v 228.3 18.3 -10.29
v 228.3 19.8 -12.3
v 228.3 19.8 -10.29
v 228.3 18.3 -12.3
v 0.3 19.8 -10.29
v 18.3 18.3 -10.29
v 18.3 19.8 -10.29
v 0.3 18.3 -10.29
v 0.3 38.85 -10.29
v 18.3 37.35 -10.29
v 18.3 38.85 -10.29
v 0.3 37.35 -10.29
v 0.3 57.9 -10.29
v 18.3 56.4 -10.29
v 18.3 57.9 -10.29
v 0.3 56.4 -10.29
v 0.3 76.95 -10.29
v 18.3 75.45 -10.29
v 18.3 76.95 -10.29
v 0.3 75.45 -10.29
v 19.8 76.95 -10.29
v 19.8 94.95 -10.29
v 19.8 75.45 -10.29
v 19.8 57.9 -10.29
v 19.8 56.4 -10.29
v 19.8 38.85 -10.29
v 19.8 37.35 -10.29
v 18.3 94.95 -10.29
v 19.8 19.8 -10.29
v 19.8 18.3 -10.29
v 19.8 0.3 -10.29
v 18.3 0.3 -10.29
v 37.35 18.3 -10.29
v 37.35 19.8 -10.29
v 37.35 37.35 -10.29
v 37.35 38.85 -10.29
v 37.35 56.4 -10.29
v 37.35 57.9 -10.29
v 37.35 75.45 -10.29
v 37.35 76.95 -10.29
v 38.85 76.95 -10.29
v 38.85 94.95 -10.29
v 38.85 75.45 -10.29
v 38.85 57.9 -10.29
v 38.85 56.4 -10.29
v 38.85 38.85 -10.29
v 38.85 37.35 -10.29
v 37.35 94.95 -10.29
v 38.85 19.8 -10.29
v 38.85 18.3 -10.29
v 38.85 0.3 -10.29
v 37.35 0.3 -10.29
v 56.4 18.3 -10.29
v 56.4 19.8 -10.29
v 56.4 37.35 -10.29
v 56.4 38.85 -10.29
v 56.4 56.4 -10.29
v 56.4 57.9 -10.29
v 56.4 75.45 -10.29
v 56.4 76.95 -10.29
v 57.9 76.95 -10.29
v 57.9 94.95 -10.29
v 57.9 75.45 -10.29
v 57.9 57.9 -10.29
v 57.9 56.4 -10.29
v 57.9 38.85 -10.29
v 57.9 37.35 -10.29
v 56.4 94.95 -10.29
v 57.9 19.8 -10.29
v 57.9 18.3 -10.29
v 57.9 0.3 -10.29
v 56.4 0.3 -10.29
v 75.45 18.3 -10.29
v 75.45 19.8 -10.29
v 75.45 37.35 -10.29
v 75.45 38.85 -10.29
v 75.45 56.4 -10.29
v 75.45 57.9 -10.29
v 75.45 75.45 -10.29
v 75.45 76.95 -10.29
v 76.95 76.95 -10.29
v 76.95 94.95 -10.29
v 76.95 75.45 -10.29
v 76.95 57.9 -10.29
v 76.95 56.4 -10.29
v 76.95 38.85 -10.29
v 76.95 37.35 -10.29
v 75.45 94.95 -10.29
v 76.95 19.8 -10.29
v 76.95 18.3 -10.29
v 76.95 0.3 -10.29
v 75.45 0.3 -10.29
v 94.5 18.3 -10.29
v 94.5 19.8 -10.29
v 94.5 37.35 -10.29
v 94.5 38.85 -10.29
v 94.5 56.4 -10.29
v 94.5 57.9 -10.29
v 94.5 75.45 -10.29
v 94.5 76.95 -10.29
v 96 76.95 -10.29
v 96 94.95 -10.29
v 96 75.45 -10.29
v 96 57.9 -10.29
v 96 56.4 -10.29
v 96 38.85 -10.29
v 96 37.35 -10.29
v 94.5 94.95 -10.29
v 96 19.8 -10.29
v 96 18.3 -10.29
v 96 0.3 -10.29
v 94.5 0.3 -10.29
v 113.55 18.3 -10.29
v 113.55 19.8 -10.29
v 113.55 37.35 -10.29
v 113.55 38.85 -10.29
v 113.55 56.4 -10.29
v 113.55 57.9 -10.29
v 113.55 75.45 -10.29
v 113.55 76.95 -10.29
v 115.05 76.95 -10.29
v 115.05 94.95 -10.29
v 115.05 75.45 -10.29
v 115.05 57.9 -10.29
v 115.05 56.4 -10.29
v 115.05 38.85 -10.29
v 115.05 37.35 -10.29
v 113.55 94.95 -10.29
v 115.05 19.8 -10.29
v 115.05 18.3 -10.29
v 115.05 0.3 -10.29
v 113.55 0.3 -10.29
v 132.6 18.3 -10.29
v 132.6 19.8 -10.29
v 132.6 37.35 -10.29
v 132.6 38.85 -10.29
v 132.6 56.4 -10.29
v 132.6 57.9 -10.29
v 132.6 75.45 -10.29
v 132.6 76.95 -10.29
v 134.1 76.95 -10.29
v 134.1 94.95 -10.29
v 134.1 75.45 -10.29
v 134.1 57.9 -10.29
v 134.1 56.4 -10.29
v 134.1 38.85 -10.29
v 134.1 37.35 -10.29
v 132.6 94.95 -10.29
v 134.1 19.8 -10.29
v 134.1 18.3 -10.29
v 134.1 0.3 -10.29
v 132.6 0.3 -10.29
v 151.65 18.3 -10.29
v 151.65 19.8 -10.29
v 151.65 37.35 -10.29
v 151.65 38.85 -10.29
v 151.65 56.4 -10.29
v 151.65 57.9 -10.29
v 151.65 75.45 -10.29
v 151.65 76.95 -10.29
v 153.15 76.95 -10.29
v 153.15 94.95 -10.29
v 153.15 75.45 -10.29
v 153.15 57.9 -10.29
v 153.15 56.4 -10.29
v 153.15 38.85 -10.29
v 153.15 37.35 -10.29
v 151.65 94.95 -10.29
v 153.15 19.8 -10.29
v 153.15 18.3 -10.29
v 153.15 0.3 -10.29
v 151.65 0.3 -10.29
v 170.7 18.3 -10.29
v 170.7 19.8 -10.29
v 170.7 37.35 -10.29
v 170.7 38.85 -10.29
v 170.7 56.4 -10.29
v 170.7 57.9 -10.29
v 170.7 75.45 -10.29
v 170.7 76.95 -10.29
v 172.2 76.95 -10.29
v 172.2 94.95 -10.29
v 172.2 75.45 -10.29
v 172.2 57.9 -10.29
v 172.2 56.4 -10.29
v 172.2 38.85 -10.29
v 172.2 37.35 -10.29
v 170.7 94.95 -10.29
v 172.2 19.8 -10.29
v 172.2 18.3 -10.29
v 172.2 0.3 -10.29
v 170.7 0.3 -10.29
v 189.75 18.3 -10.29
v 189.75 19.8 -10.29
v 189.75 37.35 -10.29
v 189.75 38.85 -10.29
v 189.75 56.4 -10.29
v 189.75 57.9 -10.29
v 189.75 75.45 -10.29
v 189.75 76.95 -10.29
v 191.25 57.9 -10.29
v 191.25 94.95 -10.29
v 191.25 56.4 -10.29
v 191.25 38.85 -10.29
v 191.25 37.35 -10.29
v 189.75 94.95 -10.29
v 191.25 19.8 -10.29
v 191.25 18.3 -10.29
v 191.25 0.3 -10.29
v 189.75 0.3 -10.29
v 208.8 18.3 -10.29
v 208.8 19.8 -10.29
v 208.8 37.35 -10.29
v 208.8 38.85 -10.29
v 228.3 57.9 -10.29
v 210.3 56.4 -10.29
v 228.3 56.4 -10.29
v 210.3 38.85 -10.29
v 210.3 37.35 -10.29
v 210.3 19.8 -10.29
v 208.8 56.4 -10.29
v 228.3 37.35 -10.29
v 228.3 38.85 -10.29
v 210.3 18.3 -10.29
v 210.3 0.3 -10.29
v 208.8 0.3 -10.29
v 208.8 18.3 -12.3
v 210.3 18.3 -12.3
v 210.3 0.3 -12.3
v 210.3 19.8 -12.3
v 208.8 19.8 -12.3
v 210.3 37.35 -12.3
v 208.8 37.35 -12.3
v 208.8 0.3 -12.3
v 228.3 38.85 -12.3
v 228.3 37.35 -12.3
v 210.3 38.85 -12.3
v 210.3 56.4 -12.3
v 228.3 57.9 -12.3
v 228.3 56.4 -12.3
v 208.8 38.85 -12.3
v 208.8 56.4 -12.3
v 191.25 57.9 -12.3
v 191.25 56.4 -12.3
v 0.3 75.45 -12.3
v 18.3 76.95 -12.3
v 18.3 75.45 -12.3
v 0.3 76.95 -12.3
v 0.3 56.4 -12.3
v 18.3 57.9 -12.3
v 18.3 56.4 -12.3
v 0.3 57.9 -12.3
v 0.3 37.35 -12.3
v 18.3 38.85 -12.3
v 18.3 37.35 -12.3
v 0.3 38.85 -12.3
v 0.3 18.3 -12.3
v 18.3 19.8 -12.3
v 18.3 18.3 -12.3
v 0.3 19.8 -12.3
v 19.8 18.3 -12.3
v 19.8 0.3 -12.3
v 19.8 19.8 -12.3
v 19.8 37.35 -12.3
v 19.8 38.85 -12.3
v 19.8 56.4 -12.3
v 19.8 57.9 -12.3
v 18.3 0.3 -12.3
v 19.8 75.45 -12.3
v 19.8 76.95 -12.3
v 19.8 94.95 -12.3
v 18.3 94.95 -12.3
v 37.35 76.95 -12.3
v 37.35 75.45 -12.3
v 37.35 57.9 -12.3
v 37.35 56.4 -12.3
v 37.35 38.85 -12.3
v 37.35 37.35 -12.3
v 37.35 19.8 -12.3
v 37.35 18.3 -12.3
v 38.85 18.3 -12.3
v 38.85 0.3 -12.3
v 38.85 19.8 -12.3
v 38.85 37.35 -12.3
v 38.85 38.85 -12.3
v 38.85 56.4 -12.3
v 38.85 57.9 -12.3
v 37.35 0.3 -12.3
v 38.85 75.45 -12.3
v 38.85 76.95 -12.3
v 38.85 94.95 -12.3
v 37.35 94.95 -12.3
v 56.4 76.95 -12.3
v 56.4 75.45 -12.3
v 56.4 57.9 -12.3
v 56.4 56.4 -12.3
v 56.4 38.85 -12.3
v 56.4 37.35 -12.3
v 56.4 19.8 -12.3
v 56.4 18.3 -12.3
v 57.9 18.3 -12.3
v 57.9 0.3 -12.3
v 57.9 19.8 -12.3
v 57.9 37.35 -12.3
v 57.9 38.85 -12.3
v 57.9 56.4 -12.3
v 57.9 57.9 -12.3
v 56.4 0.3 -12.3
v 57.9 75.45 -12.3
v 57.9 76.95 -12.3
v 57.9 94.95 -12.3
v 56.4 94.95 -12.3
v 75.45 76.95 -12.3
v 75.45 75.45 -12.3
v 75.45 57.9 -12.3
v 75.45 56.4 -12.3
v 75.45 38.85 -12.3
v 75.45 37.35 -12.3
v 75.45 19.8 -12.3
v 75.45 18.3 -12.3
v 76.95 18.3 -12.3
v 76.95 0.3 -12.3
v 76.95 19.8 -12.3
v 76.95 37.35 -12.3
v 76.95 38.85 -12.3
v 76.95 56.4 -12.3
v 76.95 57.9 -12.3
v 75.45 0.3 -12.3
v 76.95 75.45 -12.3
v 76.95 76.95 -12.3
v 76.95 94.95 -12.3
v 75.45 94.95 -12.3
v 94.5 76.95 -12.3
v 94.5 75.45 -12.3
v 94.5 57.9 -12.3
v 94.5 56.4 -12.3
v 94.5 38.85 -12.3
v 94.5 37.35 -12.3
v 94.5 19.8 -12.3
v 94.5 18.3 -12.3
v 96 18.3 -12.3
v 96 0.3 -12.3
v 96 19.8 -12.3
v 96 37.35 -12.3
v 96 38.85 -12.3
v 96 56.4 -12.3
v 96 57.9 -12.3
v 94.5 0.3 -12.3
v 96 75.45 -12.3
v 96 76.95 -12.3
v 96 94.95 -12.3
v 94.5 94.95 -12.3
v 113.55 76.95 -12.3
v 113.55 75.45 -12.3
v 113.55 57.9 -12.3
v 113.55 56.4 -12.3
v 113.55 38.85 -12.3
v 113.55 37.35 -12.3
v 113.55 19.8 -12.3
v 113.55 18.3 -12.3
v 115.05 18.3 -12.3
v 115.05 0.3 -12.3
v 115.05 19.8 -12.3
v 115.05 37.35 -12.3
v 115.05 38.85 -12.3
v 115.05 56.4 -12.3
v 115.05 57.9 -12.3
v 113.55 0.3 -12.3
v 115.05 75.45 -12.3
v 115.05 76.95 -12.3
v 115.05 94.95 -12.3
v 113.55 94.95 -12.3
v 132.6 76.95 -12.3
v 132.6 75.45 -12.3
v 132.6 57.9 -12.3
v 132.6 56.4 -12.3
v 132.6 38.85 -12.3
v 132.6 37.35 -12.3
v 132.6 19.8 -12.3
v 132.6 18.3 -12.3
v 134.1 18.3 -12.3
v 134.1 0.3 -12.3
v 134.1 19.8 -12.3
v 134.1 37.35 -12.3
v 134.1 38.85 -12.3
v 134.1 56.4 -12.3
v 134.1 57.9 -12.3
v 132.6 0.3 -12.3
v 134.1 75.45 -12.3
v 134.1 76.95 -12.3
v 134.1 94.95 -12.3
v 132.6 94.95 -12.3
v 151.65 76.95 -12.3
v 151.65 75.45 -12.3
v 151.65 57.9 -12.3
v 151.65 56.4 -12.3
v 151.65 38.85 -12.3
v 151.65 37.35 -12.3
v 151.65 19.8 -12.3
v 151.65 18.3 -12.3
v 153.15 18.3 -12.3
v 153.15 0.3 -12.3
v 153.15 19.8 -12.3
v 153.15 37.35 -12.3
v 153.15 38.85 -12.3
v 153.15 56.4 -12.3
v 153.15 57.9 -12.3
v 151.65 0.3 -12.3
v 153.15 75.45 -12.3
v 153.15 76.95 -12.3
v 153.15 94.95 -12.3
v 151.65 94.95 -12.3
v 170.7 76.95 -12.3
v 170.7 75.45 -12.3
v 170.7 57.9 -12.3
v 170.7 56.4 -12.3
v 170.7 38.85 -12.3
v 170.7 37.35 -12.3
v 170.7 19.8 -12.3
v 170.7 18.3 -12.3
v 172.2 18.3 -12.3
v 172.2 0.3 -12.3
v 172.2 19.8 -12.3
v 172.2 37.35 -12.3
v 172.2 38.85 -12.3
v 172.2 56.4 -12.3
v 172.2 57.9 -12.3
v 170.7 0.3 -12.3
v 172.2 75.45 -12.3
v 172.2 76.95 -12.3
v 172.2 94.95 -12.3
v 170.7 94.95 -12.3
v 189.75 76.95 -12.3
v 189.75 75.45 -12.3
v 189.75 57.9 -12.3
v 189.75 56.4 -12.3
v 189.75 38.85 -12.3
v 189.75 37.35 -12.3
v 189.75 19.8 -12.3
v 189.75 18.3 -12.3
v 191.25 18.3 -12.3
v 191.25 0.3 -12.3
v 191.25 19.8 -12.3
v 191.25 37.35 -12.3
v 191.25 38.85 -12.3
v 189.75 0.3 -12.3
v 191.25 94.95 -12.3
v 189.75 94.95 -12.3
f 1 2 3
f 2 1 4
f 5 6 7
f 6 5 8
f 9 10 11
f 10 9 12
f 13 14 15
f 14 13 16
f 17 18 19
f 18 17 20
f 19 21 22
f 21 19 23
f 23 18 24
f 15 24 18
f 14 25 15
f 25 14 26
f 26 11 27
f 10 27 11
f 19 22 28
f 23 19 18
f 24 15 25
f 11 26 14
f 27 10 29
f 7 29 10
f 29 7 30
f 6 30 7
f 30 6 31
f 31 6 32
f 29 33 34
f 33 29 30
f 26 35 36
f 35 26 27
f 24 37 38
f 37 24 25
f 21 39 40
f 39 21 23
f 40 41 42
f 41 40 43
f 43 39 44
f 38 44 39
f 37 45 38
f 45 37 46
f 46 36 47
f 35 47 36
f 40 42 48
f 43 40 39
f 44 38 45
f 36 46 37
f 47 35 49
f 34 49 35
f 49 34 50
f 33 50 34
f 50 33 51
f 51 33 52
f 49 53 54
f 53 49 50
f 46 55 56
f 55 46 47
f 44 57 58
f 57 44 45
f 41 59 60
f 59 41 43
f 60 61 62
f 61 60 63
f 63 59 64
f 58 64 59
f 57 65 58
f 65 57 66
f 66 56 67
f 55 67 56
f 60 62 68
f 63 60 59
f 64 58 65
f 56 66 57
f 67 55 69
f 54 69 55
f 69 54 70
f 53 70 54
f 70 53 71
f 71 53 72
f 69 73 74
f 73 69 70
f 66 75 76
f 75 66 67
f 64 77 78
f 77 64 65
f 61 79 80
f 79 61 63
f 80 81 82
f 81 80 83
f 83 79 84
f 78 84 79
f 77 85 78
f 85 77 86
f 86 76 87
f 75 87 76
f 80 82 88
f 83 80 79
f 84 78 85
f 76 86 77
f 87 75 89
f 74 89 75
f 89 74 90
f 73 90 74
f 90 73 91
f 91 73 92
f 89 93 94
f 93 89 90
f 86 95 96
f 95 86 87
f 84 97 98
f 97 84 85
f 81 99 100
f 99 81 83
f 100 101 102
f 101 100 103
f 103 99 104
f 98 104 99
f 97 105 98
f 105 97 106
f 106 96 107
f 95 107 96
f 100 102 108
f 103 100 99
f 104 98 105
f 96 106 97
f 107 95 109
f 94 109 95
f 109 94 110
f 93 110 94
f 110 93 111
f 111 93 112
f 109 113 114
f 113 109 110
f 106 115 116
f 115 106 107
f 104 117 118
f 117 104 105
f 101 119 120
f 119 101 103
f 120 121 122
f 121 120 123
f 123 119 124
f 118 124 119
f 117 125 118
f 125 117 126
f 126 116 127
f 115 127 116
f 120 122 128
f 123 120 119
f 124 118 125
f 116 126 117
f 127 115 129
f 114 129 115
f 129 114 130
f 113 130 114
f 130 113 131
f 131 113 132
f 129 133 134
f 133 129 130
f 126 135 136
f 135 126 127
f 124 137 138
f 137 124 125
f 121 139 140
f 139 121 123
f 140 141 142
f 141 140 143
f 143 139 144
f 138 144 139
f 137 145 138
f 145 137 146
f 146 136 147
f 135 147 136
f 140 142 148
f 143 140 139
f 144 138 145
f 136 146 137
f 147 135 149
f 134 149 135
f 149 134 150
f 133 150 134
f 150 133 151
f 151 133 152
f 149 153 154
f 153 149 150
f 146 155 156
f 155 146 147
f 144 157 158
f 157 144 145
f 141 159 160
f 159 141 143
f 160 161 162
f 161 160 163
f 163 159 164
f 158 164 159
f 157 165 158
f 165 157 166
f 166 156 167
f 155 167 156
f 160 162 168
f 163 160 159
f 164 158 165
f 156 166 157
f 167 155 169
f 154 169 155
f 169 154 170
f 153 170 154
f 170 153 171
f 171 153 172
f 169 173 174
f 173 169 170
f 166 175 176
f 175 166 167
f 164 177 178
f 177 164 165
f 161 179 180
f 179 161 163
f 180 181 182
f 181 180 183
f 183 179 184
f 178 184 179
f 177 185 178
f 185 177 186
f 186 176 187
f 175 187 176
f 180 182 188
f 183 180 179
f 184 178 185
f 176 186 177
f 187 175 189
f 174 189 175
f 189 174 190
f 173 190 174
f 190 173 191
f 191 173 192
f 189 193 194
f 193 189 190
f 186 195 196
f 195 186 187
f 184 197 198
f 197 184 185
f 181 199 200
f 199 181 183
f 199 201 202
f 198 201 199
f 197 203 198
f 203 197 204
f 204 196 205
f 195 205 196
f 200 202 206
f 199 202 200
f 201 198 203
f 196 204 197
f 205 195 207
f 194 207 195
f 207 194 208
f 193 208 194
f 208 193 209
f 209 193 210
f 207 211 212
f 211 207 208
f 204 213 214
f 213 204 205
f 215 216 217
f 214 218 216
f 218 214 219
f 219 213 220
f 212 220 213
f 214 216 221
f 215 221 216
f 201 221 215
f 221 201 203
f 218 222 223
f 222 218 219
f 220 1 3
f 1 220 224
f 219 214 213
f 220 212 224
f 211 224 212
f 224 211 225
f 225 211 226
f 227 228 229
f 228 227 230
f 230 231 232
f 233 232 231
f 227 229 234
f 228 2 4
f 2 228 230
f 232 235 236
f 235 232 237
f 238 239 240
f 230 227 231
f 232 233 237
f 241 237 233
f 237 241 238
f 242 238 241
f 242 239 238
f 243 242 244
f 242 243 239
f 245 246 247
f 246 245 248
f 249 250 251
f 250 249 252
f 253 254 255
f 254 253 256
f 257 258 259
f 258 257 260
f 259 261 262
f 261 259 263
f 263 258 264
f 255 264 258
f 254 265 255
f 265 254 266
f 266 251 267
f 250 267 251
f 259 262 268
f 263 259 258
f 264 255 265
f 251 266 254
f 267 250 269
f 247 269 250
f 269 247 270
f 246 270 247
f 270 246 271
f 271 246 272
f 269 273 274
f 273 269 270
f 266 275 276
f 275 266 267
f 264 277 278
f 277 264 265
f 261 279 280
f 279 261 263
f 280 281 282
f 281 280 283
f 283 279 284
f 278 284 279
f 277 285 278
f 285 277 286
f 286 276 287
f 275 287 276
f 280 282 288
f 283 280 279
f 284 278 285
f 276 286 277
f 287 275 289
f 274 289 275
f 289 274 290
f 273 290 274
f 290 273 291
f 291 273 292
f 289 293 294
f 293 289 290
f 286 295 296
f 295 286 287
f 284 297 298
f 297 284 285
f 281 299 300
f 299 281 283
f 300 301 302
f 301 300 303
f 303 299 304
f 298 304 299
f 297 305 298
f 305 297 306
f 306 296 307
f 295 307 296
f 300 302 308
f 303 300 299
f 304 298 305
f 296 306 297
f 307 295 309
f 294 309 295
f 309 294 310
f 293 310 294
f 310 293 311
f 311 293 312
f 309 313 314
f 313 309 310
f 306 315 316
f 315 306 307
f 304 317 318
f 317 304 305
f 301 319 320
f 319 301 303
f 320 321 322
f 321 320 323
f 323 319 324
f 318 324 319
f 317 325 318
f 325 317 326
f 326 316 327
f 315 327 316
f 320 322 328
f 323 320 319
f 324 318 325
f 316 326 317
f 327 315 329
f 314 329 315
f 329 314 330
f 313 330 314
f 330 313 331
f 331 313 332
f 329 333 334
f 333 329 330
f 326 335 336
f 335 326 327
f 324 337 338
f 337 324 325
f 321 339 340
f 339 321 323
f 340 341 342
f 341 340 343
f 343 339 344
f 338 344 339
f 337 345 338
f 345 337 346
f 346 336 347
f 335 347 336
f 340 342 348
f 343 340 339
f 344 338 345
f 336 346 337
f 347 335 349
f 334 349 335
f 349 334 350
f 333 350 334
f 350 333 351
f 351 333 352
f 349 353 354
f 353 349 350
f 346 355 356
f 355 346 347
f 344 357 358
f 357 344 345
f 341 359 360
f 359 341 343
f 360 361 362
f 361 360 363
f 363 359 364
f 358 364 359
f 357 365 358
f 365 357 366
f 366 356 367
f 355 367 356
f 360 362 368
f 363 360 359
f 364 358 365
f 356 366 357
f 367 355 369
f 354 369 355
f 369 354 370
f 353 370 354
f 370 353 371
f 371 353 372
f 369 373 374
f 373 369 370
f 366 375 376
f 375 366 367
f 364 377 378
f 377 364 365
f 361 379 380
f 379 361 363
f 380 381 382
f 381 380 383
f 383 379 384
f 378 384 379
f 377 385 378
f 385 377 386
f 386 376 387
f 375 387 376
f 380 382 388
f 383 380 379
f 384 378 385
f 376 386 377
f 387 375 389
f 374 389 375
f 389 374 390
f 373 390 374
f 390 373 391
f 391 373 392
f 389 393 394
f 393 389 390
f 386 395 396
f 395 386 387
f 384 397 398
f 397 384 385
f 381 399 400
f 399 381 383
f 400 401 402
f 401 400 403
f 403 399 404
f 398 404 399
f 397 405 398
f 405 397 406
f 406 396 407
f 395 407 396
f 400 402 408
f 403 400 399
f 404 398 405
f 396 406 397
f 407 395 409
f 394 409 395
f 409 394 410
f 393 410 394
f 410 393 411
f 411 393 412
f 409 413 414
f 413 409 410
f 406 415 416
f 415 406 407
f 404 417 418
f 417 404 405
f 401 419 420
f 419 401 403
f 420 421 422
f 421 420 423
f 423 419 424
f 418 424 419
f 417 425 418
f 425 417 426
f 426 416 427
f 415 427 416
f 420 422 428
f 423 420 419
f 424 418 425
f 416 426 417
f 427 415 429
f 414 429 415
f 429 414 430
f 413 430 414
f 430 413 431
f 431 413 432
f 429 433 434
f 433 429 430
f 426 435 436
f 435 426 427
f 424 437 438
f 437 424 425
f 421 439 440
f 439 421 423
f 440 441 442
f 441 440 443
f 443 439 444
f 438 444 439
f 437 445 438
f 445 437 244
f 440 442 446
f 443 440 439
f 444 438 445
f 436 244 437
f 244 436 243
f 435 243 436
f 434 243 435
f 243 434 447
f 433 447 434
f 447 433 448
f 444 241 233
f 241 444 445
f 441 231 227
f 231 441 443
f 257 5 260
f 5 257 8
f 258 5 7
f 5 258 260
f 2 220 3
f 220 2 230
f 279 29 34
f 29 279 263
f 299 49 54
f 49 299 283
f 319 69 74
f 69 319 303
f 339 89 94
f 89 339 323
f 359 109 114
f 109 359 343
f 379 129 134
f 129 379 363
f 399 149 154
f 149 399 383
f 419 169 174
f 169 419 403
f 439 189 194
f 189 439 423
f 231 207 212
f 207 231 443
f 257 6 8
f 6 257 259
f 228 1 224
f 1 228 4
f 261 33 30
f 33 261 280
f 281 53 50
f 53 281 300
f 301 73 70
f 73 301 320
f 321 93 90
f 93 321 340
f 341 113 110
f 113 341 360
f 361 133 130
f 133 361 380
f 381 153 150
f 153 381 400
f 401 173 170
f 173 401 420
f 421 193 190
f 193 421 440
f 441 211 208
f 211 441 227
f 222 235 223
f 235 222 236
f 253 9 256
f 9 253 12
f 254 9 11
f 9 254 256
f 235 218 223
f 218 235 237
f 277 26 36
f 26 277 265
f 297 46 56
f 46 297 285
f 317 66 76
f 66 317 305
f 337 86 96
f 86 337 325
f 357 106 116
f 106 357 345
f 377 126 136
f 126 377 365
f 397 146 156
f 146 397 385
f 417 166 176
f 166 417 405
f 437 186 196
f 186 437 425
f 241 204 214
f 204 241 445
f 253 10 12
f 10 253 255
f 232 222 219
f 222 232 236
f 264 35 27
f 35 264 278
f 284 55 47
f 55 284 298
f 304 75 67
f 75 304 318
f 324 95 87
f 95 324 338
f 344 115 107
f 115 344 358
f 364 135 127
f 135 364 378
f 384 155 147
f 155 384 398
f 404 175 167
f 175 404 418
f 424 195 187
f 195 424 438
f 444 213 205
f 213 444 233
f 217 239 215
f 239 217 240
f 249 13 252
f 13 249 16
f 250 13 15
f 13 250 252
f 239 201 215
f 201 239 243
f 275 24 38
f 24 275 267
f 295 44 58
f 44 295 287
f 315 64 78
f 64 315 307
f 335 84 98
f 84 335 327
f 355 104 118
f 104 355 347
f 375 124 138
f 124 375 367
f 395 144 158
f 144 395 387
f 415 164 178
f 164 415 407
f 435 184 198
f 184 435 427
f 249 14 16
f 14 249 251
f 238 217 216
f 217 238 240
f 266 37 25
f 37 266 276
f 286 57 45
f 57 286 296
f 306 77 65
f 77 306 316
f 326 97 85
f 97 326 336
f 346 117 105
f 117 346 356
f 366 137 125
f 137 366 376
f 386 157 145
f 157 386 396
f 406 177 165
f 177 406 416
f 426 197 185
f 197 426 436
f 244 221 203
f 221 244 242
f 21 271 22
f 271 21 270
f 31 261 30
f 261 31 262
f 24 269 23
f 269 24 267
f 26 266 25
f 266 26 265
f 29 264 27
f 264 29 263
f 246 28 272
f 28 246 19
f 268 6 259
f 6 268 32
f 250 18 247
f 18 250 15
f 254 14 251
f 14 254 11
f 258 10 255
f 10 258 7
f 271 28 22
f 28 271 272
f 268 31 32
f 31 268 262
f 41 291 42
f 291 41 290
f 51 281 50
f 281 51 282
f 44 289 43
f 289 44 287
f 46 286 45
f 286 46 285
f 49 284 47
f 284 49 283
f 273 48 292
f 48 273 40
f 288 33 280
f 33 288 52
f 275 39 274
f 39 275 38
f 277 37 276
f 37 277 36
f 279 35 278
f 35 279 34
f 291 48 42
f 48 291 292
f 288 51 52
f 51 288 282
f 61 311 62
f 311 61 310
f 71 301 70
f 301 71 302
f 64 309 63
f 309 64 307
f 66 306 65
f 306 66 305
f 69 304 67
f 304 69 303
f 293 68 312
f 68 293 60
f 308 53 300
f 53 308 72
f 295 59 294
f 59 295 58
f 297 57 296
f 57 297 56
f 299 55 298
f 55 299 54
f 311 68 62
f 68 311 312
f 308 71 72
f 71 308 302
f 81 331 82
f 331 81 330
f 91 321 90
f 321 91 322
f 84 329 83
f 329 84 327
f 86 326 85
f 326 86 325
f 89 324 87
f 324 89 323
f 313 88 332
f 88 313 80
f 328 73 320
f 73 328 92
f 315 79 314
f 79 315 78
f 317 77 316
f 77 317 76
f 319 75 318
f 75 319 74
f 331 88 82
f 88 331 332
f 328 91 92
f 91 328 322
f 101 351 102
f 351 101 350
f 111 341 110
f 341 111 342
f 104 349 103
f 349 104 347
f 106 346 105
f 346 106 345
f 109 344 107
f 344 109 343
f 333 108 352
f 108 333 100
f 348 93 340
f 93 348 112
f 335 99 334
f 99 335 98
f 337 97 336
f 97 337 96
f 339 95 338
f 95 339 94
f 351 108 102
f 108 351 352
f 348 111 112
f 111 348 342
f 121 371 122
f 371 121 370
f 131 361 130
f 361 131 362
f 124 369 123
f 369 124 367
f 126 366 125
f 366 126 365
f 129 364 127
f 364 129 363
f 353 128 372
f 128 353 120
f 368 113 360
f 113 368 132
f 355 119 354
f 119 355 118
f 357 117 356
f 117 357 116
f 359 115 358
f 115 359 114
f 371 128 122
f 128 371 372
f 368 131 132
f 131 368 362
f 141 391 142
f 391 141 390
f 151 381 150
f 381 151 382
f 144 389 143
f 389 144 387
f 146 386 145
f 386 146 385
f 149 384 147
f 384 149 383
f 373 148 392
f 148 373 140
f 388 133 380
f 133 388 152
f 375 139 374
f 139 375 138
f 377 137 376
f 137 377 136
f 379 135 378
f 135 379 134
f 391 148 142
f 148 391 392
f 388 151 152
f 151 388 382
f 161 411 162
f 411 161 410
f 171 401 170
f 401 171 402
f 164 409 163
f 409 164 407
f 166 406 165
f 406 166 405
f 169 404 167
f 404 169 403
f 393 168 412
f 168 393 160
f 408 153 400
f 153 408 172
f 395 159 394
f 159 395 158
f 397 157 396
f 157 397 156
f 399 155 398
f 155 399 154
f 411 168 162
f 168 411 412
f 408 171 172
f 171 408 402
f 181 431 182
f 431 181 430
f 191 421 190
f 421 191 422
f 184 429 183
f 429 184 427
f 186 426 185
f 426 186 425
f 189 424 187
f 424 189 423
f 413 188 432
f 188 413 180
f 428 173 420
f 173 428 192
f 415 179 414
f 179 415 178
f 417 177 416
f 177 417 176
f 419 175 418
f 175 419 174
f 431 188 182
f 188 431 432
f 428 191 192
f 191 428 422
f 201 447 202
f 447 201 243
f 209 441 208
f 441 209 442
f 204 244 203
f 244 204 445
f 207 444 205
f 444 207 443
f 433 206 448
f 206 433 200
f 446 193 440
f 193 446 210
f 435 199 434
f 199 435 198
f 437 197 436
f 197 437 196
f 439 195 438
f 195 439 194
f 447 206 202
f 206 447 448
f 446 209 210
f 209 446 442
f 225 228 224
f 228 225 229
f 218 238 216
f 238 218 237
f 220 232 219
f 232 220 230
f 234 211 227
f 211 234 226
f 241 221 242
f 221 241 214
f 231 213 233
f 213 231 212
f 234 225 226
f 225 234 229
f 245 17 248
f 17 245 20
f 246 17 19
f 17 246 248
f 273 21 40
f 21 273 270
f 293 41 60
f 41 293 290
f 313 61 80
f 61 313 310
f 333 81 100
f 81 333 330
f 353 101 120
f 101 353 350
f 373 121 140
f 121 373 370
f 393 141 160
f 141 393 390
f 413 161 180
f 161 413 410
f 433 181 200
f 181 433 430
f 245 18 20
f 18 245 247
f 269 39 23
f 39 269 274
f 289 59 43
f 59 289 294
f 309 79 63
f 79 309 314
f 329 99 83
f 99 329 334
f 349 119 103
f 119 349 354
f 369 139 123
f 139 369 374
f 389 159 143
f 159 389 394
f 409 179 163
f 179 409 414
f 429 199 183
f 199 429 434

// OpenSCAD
// file: scad/rounded_cube.scad
module pie_piece(h, r, angle = 90, start_angle = 0) {
    rotate([0, 0, start_angle])
    rotate_extrude(angle = angle)
    square([r, h]);
}

module rounded_cube(dim, r) {
    dim_cube = dim - [2*r, 0, 0];
    translate([-0.5*dim_cube[0], -0.5*dim_cube[1], 0])
        cube(dim_cube);
    translate([0.5*dim[0]-0.5*r, 0, dim[2]*0.5])
        cube([r, dim[1]-2*r, dim[2]], center = true);
    translate([-0.5*dim[0]+0.5*r, 0, dim[2]*0.5])
        cube([r, dim[1]-2*r, dim[2]], center = true);
    translate([(0.5*dim[0]-r), (0.5*dim[1]-r), 0])
        pie_piece(dim[2], r);
    translate([-(0.5*dim[0]-r), (0.5*dim[1]-r), 0])
        pie_piece(dim[2], r, start_angle = 90);
    translate([-(0.5*dim[0]-r), -(0.5*dim[1]-r), 0])
        pie_piece(dim[2], r, start_angle = 90*2);
    translate([(0.5*dim[0]-r), -(0.5*dim[1]-r), 0])
        pie_piece(dim[2], r, start_angle = 90*3);
}
// file: scad/micropro_example.scad
// Dimensions of the board
blength  = 33.6+0.3;
bwidth   = 17.9;
bthick   = 0.9;
bheight  = 4.5;
// Height of the USB port; measured from the bottom of 
// plate
busb     = 9.5;
// Width of the board minus the width of the connector
// pins
bmiddlew = 11.5;
bmiddlew2 = 5;


function micropro_length() = blength;
function micropro_width() = bwidth;


module micropro_example() {
  color("darkred") {
  translate([-bwidth/2, 0, 0])
    cube([bwidth, blength, bthick]);
  translate([-busb/2, blength-10, 0])
    cube([busb, 10, bheight]);
  translate([-bmiddlew/2, 2.5, 0])
    cube([bmiddlew, blength-5, bthick+0.2]);
  }
}

micropro_example();
// file: scad/beveled_cube.scad
// Beveled cube
//
// dim: dimensions of the cube
// bevel_top: 2d array width the dimensions of the bevel used
//   at the top of the cube. The first element specifies the 
//   amount the bevel goed towards the z-axis. The second
//   element the height of the bevel.
// bevel_size: single value with the dimension of the side 
//   bevel
// bevel_bottom: 2d array for the bottom bevel. See 
//   bevel_top. 
//
// The cube is centered at the origin for the x and y axis and 
// the bottom of the cube is positioned at z=0. 
// 
// Example:
 dim = [200, 100, 20];
 bevel_top  = [10, 3];
 bevel_side  = 8;
 bevel_bottom  = [4, 4];
 beveled_cube(dim, bevel_top, bevel_side, bevel_bottom);

module beveled_cube(dim, bevel_top, bevel_side, bevel_bottom) {
  mar = 0.01;
  d = [dim[0]*0.5+mar, dim[1]*0.5+mar, dim[2]];
  translate([-mar, -mar, 0])
    beveled_cube_q(d, bevel_top, bevel_side, bevel_bottom);
  mirror([1, 0, 0])
    translate([-mar, -mar, 0])
    beveled_cube_q(d, bevel_top, bevel_side, bevel_bottom);
  mirror([0, 1, 0])
    translate([-mar, -mar, 0])
    beveled_cube_q(d, bevel_top, bevel_side, bevel_bottom);
  mirror([1, 0, 0]) mirror([0, 1, 0])
    translate([-mar, -mar, 0])
    beveled_cube_q(d, bevel_top, bevel_side, bevel_bottom);
}

// Utility function for beveled_cube
module beveled_cube_q(dim, bt, bs, bb) {
  mar = 0.01;
  // top
  translate([0, 0, dim[2]-bt[1]])
    bevels([dim[0], dim[1], bt[1]], bt[0], bs);
  // middle
  translate([0, 0, bb[1]-mar])
    bevels([dim[0], dim[1], dim[2]-bt[1]-bb[1]+2*mar], 0, bs);
  //bottom
  translate([0, 0, bb[1]])
    mirror([0, 0, 1])
    bevels([dim[0], dim[1], bb[1]], bb[0], bs);
}

// Utility function for beveled_cube
module bevels(dim, bt, bs) {
  polyhedron(
    points = [
      [0, 0, 0], // 0
      [dim[0], 0, 0], // 1
      [dim[0]-bt, 0, dim[2]], // 2
      [0, 0, dim[2]],  // 3
      [dim[0], dim[1]-bs, 0], //4 
      [dim[0]-bt, min(dim[1]-bt, dim[1]-bs), dim[2]], //5
      [0, dim[1], 0],  // 6
      [dim[0]-bs, dim[1], 0], //7 
      [min(dim[0]-bt, dim[0]-bs), dim[1]-bt, dim[2]], //8
      [0, dim[1]-bt, dim[2]] //9
    ],
    faces = [
      [3, 9, 8, 5, 2], //top
      [0, 3, 2, 1], //front
      [0, 6, 9, 3], //left 
      [6, 7, 8, 9], // back
      [7, 4, 5, 8], // back-side-bevel
      [1, 2, 5, 4], // right side
      [0, 1, 4, 7, 6] // bottom
    ]
  );
}
// main file
$fn=100;
mar = 0.01;

// == Parameters of plate
plate_grid        = 19.05;
plate_thickness   = 1.45;
plate_nwidth      = 12;
plate_nlength     = 5;
plate_width       = plate_grid*plate_nwidth;
plate_length      = plate_grid*plate_nlength;

// == Parameters for switches
// https://switches-sensors.zf.com/wp-content/uploads/2012/07/Keymodule_MX_EN.pdf
switch_depth      = 5;
switch_pinlength  = 3.3;
switch_stick_out  = switch_depth+switch_pinlength - plate_thickness;

// == Parameters of outer case
case_pad          = 2*10;
case_width        = plate_width + case_pad;
case_length       = plate_length + case_pad;
case_height       = 15.74;
case_bevel_top    = 3;
case_bevel_corner = 5;
case_bevel_bottom = 3;
case_bevel_inner  = 2;
case_usb_inset    = 20;

// == Parameters for raster
raster_height     = 5-1.5;
raster_width      = 1.5;
raster_skip       = 6;

// == Parameters for guides
guide_width       = raster_width;
guide_height      = switch_stick_out + 1;
guide_left        = plate_grid*0.6;
guide_right       = plate_grid*0.1;
guide_top         = plate_grid*0.5;
guide_bottom      = plate_grid*0.15;

// == Parameters for bottom
bottom_thickness  = 2;
bottom_inset      = bottom_thickness;
bottom_edge       = 5;
bottom_mar        = 0.3;
bottom_raster     = 2;

// == Parameters for controler and USB port
controller_row     = plate_nwidth-1;
controller_depth   = 2.5;
controller_base    = 0.9;
controller_wall    = 2;
controller_width   = micropro_width()+1;
controller_height  = controller_base+0.5;
controller_support = 0.8;
controller_length  = 31.6;

use<scad/beveled_cube.scad>
use<scad/micropro_example.scad>
use<scad/rounded_cube.scad>

case = false;
bottom = true;

// how far does switch stick out at the back of the plate:
// https://switches-sensors.zf.com/wp-content/uploads/2012/07/Keymodule_MX_EN.pdf
// 5 mm thickness swith
// 3.3 mm length pins
// -1.5 thickness plate
// 5 + 3.3 - 1.5


if (case) {

// === TOP PLATE
color("red")
linear_extrude(plate_thickness)
  translate([-0.0947, -0.2578])
  import("sources/plate_base.dxf", convexity = 10);
  
// === CASE
translate([(plate_width)/2, plate_length/2, -case_height+plate_thickness])
difference() {
  // outside of case
  beveled_cube([case_width, case_length, case_height], 
      [case_bevel_top,case_bevel_top], case_bevel_corner, 
      [case_bevel_bottom, case_bevel_bottom]);
  // cut out central cube (where the plate is)
  translate([0, 0, -1])
    beveled_cube([plate_width-2*mar, plate_length-2*mar, case_height+2],
      [0.1, 0.1], case_bevel_inner, [0.1,0.1]);  
  // cut-out for bottom
  translate([0, 0, -mar])
    beveled_cube([plate_width+2*bottom_edge, plate_length+2*bottom_edge, bottom_inset+mar],
      [0, 0], case_bevel_inner, [0,0]);
  // cutout for USB-port 
  translate(-[(plate_width)/2, plate_length/2, -case_height+plate_thickness])
  translate([controller_row*plate_grid, plate_length+controller_depth+controller_wall, 
      -usb_hole_height()-guide_height-controller_base])
    translate([0, 0, 3.5/2])
    usb_hole(20, 10, 20);
  // cutout for usb port on controller
  translate(-[(plate_width)/2, plate_length/2, -case_height+plate_thickness])
  translate([controller_row*plate_grid-usb_width()/2, plate_length+controller_depth-case_pad, 
      -case_height-guide_height])
    cube([usb_width(), case_pad, case_height]);
  // cutout for the board of the controller
  // we leave a few part with width controller_support; otherwise the printer is 
  // unable to print the top of the hole as this is then not supported
  conthw = (controller_width-usb_width())/2;
  translate(-[(plate_width)/2, plate_length/2, -case_height+plate_thickness])
  translate([controller_row*plate_grid-controller_width/2, plate_length-2*mar, -guide_height])
    mirror([0, 0, 1])
    cube([conthw-controller_support, controller_depth+mar, controller_height]);
  translate(-[(plate_width)/2, plate_length/2, -case_height+plate_thickness])
  translate([controller_row*plate_grid-conthw+controller_width/2+controller_support, 
        plate_length-2*mar, -guide_height])
    mirror([0, 0, 1])
    cube([conthw-controller_support, controller_depth+mar, controller_height]);
  // holes for the screws to fix the bottom plate
  translate([(plate_width/2+bottom_edge/2-1), (plate_length/2+bottom_edge/2-1), bottom_inset-mar])
    cylinder(r = 3.2/2, h = 8);
  translate([(plate_width/2+bottom_edge/2-1), -(plate_length/2+bottom_edge/2-1), bottom_inset-mar])
    cylinder(r = 3.2/2, h = 8);
  translate([-(plate_width/2+bottom_edge/2-1), (plate_length/2+bottom_edge/2-1), bottom_inset-mar])
    cylinder(r = 3.2/2, h = 8);
  translate([-(plate_width/2+bottom_edge/2-1), -(plate_length/2+bottom_edge/2-1), bottom_inset-mar])
    cylinder(r = 3.2/2, h = 8);
}


// Inset for USB-port
// at the bottom below the usb port the rim in the case for the bottom plate
difference() {
  translate([controller_row*plate_grid, plate_length+bottom_edge+mar, -case_height+plate_thickness])
  mirror([0, 1, 0])
  union(){
    //cube([case_usb_inset, bottom_edge-controler_depth+mar, bottom_inset+mar]);
    translate([-mar, 0, 0])
      bevels([case_usb_inset/2+mar, bottom_edge-controller_depth+mar, bottom_inset+mar], 
        0, bottom_edge- controller_depth+mar);
    mirror([1, 0, 0]) 
      bevels([case_usb_inset/2, bottom_edge-controller_depth+mar, bottom_inset+mar], 
        0, bottom_edge-controller_depth+mar);
  }
  // cutout for USB
  translate([controller_row*plate_grid, plate_length+controller_depth+controller_wall, 
      -usb_hole_height()-guide_height-controller_base])
    translate([0, 0, 3.5/2])
      usb_hole(20, 10, 20);
}


// === RASTER
// Raster in x/width direction
for (i = [1:(plate_nlength-1)]) {
  translate([-mar, i*plate_grid-raster_width/2, -raster_height])
    cube([plate_width+2*mar, raster_width, raster_height+mar]);
}
// Raster in y/length direction
for (i = [1:(plate_nwidth-1)]) {
  if (i == raster_skip) {
    translate([i*plate_grid-raster_width/2, -mar+plate_grid, -raster_height])
      cube([raster_width, plate_length+2*mar-plate_grid, raster_height+mar]);
  } else {
    translate([i*plate_grid-raster_width/2, -mar, -raster_height])
      cube([raster_width, plate_length+2*mar, raster_height+mar]);
  }
}

// === GUIDES
// Guides in x/width direction
for (j = [1:(plate_nlength-1)]) for (i = [1:(plate_nwidth)]) {
  // Left part of guide
  translate([i*plate_grid-guide_left+mar, j*plate_grid-guide_width/2, -guide_height])
    cube([guide_left+mar, guide_width, guide_height+mar]);
  // Right part 
  translate([i*plate_grid-plate_grid-mar, j*plate_grid-guide_width/2, -guide_height])
    cube([guide_right+mar, guide_width, guide_height+mar]);
}
// Guides in y/length direction
for (j = [1:(plate_nlength)]) for (i = [1:(plate_nwidth-1)]) {
  if (j != 1 || i != raster_skip) {
    // Top part of guide
    translate([i*plate_grid-guide_width/2, j*plate_grid-guide_top+mar, -guide_height])
      cube([guide_width, guide_top+mar, guide_height+mar]);
    // Bottom part of guide
    translate([i*plate_grid-guide_width/2, (j-1)*plate_grid-mar, -guide_height])
      cube([guide_width, guide_bottom+mar, guide_height+mar]);
  }
}

// === STOPPER FOR CONTROLER
translate([controller_row*plate_grid, plate_length-guide_width-controller_length, 
    -raster_height+mar])
  mirror([0, 0, 1])
  tapered_cube(guide_width, 7, guide_height-raster_height+controller_depth, guide_width);
translate([controller_row*plate_grid-guide_width/2, plate_length-5-controller_length, 
    -guide_height])
  mirror([0, 0, 0])
  cube([guide_width, 5, guide_width]);



} //end case

// === BOTTOM
if (bottom) {
  
  translate([(plate_width)/2, plate_length/2, -case_height+plate_thickness])
  color("pink")
  difference() {
    // bottom
    #translate([0, 0, 0])
      beveled_cube([plate_width+2*bottom_edge-2*bottom_mar, plate_length+2*bottom_edge-2*bottom_mar, bottom_thickness],
        [0, 0], case_bevel_inner, [0,0]);
    // Inset for USB-port
    translate([controller_row*plate_grid-plate_width/2, plate_length/2+bottom_edge+mar-bottom_mar, -mar])
      mirror([0, 1, 0])
      union(){
        //cube([case_usb_inset, bottom_edge-controler_depth+mar, bottom_inset+mar]);
        translate([-mar, 0, 0])
          bevels([(case_usb_inset+bottom_mar)/2+mar, bottom_edge-controller_depth+mar, bottom_inset+2*mar], 
            0, bottom_edge- controller_depth+mar);
        mirror([1, 0, 0]) 
          bevels([(case_usb_inset+bottom_mar)/2, bottom_edge-controller_depth+mar, bottom_inset+2*mar], 
            0, bottom_edge-controller_depth+mar);
      }
    // holes for the screws to fix the bottom plate
    translate([+(plate_width/2+bottom_edge/2-1), +(plate_length/2+bottom_edge/2-1), +0.4]) 
      mirror([0, 0, 1]) screw_hole(r1 = 2/2, r2 = 4/2);
    translate([-(plate_width/2+bottom_edge/2-1), +(plate_length/2+bottom_edge/2-1), +0.4]) 
      mirror([0, 0, 1]) screw_hole(r1 = 2/2, r2 = 4/2);
    translate([+(plate_width/2+bottom_edge/2-1), -(plate_length/2+bottom_edge/2-1), +0.4]) 
      mirror([0, 0, 1]) screw_hole(r1 = 2/2, r2 = 4/2);
    translate([-(plate_width/2+bottom_edge/2-1), -(plate_length/2+bottom_edge/2-1), +0.4]) 
      mirror([0, 0, 1]) screw_hole(r1 = 2/2, r2 = 4/2);  
  }

  // Raster in x/width direction
  for (i = [1:(plate_nlength-2)]) {
    translate([+bottom_mar, i*plate_grid-raster_width/2, -case_height+plate_thickness+bottom_raster-mar])
      cube([plate_width-2*bottom_mar, raster_width, bottom_raster+mar]);
  }
  // last row until controller
  translate([+bottom_mar, (plate_nlength-1)*plate_grid-raster_width/2, 
      -case_height+plate_thickness+bottom_raster-mar])
    cube([plate_width-2*bottom_mar-(plate_nwidth-controller_row+1)*plate_grid, 
      raster_width, bottom_raster+mar]);
  
  // Raster in y/length direction
  for (i = [1:(plate_nwidth-1)]) {
    if (i != controller_row) {
      translate([i*plate_grid-raster_width/2, +bottom_mar, -case_height+plate_thickness+bottom_raster-mar])
        cube([raster_width, plate_length-2*bottom_mar, bottom_raster+mar]);
    } else {
      translate([i*plate_grid-raster_width/2, +bottom_mar, -case_height+plate_thickness+bottom_raster-mar])
        cube([raster_width, plate_length-2*bottom_mar-2*plate_grid, bottom_raster+mar]);
    }
  }
} // end bottom








module usb_hole(length1, length2, height1 = 8/2, height2 = 8/2, width = 13, bevel = 2) {
  translate([0, 0, (height2-height1)/2])
  rotate([-90, 0, 0])
  beveled_cube([width, height1+height2, length2], [0, 0], bevel, [0, 0]);
  rotate([90, 0, 0]) 
  rounded_cube([9.5, 3.5, length1], 1.75); 
}
function usb_width() = 9.5;
function usb_hole_height() = 3.5;
function usb_hole_width()  = 13;


module screw_hole(r1, r2, l1=20, l2=20, mar = 0.01) {
  dh = abs(r2-r1);
  translate([0, 0, -l1-dh+mar])
    cylinder(r = r1, h = l1);
  translate([0, 0, -dh])
    cylinder(r1 = r1, r2 = r2, h = dh);
  translate([0, 0, -mar])
    cylinder(r = r2, h = l2);
}


module tapered_cube(base, top, height, depth) {
  h1 = (top-base)/2;
  union() {
    linear_extrude(h1, scale = [top/base,1]) square([base/2,depth]);
    mirror([1, 0, 0]) linear_extrude(h1, scale = [top/base,1]) square([base/2,depth]);
    translate([-top/2, 0, h1])
    cube([top, depth, height-h1]);
  }
}


//// usb hole
//  translate([grid, nlength*grid-1, -cross_height-3.5/2-bthick])
//    rotate([-90, 0, 0])
//    rounded_cube([busb+0.5, 3.5, wall+2], 1.75);  
//  // slot for plate
//  translate([grid-bwidth/2, nlength*grid-1, -cross_height-bthick-0])
//    cube([bwidth, wall, bthick+0]);
//




//translate([controller_row*plate_grid, plate_length-micropro_length()+2.5, -guide_height])
//mirror([0, 0, 1])
//micropro_example();

//translate([0, 0, -case_height-0.1])
//color("green")
//cylinder(r = 3.2/2, h = 4.5);
